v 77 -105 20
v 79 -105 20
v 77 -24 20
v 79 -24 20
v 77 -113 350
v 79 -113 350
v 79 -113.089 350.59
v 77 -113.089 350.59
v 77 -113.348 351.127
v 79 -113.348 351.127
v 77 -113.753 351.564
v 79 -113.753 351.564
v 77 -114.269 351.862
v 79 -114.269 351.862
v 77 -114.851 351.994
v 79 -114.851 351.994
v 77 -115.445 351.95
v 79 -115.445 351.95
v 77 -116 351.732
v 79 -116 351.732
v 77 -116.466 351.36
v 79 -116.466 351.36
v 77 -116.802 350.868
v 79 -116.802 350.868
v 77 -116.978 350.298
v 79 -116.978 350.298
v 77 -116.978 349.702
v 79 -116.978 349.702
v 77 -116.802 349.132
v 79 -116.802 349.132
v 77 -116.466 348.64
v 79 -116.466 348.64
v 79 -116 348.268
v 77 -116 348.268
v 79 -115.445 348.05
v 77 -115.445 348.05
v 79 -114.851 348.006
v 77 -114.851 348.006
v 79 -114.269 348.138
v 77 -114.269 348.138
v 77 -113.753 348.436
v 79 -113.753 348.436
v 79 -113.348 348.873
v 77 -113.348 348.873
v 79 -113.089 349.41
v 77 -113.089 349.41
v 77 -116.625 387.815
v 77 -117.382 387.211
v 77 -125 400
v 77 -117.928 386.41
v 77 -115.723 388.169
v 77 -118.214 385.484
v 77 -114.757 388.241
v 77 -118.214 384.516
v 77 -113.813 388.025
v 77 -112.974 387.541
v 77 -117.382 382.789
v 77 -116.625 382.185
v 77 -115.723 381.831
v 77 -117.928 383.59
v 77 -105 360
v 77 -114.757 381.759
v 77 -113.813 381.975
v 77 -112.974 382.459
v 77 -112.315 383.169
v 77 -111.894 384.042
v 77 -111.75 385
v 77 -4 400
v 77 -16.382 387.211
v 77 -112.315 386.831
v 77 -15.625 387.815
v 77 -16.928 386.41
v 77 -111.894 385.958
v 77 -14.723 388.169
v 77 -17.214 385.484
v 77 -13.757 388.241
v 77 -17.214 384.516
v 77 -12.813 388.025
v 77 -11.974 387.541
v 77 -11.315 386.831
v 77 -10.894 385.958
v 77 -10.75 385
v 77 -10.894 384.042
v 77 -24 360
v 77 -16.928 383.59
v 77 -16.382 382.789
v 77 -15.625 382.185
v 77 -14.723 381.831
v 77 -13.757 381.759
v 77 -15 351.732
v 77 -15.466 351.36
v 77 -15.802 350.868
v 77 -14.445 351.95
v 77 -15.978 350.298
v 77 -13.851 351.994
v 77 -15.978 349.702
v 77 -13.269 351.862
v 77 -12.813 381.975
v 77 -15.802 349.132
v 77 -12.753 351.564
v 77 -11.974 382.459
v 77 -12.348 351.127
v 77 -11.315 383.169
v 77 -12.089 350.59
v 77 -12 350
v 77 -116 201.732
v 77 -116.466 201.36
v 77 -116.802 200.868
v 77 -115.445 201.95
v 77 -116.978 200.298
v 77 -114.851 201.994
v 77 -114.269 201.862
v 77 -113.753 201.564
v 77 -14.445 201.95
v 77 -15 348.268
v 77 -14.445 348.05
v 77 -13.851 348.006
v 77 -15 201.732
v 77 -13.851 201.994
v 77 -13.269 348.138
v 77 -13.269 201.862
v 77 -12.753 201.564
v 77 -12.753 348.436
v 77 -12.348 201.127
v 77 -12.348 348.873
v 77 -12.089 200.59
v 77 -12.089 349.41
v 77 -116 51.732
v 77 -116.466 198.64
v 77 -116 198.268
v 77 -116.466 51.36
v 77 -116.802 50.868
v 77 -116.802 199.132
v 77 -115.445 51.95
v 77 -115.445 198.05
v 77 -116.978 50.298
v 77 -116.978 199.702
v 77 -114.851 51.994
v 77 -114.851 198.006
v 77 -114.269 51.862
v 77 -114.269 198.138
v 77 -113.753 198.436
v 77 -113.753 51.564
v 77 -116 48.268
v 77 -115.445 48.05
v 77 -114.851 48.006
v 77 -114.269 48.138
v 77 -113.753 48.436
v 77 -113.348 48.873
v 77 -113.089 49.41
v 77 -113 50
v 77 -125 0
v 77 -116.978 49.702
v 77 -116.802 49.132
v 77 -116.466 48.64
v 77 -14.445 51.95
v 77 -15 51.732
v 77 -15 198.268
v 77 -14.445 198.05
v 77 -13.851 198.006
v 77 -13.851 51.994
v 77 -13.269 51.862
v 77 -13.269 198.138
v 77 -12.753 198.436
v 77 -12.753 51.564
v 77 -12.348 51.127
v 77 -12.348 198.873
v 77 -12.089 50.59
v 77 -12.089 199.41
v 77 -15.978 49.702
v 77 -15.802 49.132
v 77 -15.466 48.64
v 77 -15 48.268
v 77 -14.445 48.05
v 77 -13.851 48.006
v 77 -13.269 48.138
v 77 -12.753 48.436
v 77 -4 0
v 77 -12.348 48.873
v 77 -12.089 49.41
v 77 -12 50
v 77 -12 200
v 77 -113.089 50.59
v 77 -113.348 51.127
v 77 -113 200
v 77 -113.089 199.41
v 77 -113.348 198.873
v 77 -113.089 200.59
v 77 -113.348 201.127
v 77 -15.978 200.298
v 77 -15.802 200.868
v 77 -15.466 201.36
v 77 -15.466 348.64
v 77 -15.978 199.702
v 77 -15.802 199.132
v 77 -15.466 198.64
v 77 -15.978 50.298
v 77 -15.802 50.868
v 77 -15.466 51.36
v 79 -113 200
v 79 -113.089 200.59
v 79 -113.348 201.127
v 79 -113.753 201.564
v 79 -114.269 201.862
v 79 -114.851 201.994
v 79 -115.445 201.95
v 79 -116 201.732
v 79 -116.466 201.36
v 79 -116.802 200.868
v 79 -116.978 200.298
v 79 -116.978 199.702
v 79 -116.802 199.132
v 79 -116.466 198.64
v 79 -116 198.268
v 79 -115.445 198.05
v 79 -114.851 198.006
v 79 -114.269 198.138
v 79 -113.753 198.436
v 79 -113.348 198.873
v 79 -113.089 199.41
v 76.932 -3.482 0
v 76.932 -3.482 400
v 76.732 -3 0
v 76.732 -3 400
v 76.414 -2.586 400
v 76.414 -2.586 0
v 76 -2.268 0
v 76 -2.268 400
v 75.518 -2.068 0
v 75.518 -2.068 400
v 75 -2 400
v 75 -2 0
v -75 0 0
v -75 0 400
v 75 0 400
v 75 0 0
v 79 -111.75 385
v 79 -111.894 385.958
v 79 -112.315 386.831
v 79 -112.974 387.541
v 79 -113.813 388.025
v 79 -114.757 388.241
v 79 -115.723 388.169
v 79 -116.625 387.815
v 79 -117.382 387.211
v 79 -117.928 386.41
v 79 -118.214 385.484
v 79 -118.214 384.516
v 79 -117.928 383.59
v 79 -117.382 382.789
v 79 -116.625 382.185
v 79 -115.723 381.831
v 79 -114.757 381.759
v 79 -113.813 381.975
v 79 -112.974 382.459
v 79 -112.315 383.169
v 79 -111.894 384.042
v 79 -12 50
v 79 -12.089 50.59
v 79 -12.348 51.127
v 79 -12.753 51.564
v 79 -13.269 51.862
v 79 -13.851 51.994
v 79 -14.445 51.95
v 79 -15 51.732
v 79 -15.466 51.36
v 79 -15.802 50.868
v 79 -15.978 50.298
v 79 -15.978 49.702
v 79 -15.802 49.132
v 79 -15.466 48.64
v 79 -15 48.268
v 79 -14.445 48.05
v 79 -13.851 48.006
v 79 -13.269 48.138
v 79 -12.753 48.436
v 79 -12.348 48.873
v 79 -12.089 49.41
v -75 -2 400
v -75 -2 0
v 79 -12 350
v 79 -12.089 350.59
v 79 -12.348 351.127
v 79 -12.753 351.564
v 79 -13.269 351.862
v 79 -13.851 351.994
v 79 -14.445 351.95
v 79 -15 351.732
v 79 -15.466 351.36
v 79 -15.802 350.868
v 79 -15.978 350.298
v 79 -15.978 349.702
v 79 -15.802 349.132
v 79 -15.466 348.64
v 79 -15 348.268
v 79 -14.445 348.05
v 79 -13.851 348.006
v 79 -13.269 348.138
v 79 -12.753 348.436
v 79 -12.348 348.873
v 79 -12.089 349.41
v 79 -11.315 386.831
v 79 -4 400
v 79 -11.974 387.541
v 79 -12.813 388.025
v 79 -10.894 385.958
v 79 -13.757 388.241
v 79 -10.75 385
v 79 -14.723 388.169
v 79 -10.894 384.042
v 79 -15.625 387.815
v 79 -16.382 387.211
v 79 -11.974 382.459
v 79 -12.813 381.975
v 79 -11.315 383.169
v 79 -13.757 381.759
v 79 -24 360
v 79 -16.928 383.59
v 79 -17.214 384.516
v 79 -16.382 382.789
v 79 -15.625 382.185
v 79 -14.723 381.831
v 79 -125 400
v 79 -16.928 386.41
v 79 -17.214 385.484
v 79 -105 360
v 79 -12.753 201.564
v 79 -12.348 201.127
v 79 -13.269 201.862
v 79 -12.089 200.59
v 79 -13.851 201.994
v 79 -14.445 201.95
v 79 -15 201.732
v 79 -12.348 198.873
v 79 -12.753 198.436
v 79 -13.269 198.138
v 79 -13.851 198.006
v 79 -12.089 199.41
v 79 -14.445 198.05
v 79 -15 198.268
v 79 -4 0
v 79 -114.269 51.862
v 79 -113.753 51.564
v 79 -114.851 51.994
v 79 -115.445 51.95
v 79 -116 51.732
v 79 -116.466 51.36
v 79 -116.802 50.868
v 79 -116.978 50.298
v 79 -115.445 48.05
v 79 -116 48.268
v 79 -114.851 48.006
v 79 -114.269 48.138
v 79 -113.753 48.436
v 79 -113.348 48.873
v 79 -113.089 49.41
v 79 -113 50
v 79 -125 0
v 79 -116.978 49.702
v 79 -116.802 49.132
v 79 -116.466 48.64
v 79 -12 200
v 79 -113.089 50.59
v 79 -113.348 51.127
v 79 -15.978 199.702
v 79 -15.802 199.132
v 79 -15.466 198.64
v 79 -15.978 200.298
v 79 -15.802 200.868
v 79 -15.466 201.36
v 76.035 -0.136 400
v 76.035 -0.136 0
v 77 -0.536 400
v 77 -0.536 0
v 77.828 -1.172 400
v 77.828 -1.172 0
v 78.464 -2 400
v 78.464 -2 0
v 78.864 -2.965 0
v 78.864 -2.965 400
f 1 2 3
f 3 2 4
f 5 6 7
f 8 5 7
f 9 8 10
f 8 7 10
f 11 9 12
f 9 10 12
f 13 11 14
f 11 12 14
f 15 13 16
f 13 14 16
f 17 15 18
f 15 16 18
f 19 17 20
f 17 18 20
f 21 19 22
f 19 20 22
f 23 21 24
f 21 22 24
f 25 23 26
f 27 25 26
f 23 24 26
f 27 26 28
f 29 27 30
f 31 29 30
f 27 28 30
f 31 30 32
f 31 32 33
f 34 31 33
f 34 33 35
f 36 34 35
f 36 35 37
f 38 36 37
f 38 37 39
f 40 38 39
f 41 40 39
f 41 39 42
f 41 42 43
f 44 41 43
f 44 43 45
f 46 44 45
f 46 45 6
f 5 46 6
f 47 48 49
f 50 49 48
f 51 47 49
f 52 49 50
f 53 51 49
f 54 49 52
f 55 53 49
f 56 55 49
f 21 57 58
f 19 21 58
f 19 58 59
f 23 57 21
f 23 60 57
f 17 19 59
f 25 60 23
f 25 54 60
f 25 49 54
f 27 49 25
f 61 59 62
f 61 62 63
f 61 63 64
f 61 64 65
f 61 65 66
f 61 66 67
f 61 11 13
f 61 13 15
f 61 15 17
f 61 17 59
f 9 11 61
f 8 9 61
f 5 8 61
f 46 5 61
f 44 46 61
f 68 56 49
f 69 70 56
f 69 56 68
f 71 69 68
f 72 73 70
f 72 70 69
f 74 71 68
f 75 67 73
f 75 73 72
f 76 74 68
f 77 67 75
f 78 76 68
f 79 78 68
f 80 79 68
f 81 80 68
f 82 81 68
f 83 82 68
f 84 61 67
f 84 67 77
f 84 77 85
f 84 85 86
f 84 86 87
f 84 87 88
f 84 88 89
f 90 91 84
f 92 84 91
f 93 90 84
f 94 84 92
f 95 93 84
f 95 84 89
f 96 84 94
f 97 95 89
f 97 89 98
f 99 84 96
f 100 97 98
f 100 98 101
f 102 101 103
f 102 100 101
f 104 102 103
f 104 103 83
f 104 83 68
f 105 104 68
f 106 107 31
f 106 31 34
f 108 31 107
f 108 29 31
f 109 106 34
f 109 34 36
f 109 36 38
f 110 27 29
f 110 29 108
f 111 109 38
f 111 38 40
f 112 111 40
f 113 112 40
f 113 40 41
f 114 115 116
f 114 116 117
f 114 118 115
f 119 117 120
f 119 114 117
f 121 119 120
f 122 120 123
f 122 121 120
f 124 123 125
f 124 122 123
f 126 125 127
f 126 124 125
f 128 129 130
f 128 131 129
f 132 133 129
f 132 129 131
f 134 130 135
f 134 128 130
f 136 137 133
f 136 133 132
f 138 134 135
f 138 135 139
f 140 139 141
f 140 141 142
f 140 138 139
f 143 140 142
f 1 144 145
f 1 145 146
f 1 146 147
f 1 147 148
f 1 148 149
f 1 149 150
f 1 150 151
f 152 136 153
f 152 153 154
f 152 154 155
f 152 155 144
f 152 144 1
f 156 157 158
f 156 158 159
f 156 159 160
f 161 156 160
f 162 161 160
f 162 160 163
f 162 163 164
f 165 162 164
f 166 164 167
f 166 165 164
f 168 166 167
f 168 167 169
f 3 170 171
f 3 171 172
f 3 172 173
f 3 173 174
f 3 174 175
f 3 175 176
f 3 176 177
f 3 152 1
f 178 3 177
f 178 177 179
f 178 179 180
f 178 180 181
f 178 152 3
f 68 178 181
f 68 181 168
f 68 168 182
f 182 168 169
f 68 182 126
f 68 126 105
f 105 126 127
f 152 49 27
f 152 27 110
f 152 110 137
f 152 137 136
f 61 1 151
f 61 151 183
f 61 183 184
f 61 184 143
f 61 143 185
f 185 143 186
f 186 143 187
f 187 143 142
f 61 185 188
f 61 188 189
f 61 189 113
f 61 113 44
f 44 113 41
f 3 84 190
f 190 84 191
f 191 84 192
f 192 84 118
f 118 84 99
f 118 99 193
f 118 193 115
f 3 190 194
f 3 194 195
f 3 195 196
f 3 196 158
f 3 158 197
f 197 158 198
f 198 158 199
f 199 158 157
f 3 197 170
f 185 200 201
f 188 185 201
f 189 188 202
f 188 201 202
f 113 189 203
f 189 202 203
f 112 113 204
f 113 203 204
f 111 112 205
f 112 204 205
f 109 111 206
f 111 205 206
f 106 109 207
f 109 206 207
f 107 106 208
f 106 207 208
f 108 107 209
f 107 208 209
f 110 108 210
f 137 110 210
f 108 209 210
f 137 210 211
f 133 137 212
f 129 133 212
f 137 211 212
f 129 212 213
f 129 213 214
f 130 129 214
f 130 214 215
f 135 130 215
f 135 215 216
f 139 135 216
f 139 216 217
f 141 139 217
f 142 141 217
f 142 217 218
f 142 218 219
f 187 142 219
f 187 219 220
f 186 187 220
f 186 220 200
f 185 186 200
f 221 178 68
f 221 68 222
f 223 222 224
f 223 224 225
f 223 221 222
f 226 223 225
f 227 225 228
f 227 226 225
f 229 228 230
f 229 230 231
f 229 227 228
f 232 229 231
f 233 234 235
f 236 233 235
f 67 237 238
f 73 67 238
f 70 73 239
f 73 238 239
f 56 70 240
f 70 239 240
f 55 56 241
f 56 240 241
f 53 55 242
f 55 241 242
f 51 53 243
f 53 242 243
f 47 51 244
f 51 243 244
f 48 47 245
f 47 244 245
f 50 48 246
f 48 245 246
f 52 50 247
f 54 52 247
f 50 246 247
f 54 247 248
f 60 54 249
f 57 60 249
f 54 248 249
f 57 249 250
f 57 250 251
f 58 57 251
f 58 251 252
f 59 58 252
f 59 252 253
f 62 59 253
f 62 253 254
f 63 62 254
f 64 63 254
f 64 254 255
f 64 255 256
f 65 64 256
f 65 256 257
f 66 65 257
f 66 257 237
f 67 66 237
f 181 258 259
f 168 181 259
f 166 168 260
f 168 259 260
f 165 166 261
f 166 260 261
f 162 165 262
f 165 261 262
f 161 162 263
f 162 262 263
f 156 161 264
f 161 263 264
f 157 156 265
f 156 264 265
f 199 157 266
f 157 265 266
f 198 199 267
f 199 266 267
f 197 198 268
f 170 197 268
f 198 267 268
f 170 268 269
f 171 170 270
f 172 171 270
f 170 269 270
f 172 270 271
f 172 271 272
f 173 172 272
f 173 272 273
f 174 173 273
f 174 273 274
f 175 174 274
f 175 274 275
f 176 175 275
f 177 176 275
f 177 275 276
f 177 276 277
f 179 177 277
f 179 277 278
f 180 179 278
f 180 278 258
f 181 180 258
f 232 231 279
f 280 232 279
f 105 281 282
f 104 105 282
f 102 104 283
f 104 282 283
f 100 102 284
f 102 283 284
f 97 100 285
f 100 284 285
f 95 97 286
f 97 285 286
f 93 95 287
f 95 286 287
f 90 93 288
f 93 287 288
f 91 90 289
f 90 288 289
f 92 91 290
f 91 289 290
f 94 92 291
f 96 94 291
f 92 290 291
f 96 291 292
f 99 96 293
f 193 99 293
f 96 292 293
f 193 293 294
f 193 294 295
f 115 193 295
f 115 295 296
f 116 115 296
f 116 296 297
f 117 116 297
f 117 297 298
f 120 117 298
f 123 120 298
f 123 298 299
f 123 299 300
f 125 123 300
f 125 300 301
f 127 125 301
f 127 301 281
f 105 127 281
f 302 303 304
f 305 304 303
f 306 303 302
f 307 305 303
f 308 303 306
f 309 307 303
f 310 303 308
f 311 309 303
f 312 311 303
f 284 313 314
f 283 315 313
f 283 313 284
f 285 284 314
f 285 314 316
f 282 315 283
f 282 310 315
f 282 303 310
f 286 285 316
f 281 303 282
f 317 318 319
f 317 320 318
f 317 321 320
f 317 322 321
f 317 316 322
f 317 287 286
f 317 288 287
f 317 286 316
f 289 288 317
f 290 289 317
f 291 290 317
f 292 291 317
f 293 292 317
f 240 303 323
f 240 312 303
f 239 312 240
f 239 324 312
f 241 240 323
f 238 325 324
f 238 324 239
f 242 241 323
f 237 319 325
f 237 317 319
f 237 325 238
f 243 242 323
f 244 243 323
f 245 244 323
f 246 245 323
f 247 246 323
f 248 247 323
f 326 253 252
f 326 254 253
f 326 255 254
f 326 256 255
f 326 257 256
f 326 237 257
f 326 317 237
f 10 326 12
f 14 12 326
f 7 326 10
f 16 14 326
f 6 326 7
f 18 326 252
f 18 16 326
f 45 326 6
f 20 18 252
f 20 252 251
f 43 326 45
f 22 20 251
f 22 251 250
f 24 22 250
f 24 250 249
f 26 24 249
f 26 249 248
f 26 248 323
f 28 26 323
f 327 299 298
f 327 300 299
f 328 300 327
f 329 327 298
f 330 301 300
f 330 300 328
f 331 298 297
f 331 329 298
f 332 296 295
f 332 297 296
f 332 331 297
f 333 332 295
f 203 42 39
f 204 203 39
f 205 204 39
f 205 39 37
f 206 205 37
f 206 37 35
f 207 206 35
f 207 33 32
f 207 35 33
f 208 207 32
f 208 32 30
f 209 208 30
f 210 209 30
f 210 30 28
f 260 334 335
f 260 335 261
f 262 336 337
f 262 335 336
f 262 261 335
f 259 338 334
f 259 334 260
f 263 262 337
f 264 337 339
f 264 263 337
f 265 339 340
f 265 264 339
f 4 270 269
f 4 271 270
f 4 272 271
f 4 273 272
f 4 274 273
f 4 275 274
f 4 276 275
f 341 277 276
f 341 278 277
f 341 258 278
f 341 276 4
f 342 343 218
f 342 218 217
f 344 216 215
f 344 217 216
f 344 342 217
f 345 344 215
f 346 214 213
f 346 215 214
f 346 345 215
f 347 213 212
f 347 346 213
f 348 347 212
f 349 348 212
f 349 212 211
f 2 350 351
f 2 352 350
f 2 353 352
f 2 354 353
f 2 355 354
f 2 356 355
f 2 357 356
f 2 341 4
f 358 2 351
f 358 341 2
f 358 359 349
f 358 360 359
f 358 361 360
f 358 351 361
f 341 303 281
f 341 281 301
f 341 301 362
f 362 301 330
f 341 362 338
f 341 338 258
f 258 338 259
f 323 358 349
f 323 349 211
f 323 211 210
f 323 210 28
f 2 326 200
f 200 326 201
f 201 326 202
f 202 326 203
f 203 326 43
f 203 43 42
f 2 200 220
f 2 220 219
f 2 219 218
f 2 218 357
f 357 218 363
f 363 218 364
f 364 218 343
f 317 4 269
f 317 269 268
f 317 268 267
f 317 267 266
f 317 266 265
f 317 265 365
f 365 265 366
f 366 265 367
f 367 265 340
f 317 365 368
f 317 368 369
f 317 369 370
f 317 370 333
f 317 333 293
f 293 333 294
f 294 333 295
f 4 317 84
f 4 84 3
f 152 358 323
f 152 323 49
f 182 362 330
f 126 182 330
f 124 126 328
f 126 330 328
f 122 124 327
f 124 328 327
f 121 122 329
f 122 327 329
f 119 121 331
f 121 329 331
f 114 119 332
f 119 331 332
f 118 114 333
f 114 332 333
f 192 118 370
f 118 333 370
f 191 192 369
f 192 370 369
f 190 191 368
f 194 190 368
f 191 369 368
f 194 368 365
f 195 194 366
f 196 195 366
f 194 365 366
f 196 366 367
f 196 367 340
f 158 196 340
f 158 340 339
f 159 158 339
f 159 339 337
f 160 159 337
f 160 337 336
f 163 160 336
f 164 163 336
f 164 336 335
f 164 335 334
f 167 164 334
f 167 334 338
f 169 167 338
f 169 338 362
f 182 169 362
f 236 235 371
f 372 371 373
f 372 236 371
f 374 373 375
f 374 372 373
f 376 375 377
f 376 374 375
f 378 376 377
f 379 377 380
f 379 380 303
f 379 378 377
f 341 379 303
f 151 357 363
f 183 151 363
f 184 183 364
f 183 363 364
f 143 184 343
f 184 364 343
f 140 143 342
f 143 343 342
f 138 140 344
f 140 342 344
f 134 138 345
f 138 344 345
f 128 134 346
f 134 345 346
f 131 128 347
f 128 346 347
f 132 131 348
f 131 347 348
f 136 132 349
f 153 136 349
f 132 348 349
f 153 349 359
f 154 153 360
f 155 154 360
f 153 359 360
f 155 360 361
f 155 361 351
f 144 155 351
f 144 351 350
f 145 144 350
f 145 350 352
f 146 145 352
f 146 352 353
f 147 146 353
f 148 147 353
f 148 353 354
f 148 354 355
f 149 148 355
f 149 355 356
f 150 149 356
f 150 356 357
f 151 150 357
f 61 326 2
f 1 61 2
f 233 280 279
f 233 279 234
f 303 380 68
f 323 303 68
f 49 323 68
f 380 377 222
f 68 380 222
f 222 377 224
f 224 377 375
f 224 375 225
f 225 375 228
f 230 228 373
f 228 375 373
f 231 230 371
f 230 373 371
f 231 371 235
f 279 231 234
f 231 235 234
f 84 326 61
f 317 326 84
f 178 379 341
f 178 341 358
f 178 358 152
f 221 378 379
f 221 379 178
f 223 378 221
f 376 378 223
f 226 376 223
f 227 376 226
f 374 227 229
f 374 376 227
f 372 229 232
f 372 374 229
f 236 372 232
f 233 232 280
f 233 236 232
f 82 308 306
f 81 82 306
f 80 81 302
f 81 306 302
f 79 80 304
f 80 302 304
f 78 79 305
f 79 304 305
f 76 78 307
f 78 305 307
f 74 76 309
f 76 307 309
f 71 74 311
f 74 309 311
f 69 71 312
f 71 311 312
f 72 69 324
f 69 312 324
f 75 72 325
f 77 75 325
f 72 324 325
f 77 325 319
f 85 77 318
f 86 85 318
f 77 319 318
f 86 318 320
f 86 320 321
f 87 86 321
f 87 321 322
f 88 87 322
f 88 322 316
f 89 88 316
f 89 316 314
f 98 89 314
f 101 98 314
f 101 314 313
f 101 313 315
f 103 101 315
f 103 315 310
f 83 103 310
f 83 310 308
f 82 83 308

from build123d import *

# Parameters (mm, degrees)
BOSS_EXTRUDE1_DEPTH  = 400
CUT_EXTRUDE1_REACH   = 448.476
SKETCH2_W            = 340
SKETCH2_H            = 81
CUT_EXTRUDE2_REACH   = 448.476
SKETCH4_R            = 3.25
SKETCH5_R            = 2
CUT_EXTRUDE3_DEPTH   = 10
CONVERT_SOLID1_DEPTH = 400


# Read off the part's stored shape, not the designer's step: Convert-Solid1
with BuildPart() as part:
    # Sketch1 → Boss-Extrude1 (new body)
    with BuildSketch(Plane.XY):
        with BuildLine():
            Line((-75, 0), (75, 0))
            ThreePointArc((75, 0), (77.828427125, -1.171572875), (79, -4))
            Line((79, -4), (79, -125))
            Line((79, -125), (77, -125))
            Line((77, -125), (77, -6))
            ThreePointArc((77, -6), (75.828427125, -3.171572875), (73, -2))
            Line((73, -2), (-75, -2))
            Line((-75, -2), (-75, 0))
        make_face()
    extrude(amount=BOSS_EXTRUDE1_DEPTH)

    # Sketch2 → Cut-Extrude1 (cut, up to next)
    with BuildSketch(Plane(origin=(79, 0, 0), x_dir=(0, 0, -1), z_dir=(1, 0, 0)), mode=Mode.PRIVATE) as cut_extrude1_sk1:
        with Locations((-190, -64.5)):
            Rectangle(SKETCH2_W, SKETCH2_H)
    cut_extrude1_tool1 = extrude(cut_extrude1_sk1.sketch, amount=-CUT_EXTRUDE1_REACH, mode=Mode.PRIVATE) & part.part
    add(cut_extrude1_tool1.solids().sort_by_distance((79, -64.5, 190))[0], mode=Mode.SUBTRACT)

    # Sketch4 → Cut-Extrude2 (cut, up to next)
    with BuildSketch(Plane(origin=(79, 0, 0), x_dir=(0, 0, -1), z_dir=(1, 0, 0)), mode=Mode.PRIVATE) as cut_extrude2_sk1:
        with Locations(Location((-385, -14, 0), (0, 0, 90))):
            Circle(SKETCH4_R)
    cut_extrude2_tool1 = extrude(cut_extrude2_sk1.sketch, amount=-CUT_EXTRUDE2_REACH, mode=Mode.PRIVATE) & part.part
    # Sketch4 → Cut-Extrude2 (cut, up to next)
    with BuildSketch(Plane(origin=(79, 0, 0), x_dir=(0, 0, -1), z_dir=(1, 0, 0)), mode=Mode.PRIVATE) as cut_extrude2_sk2:
        with Locations(Location((-385, -115, 0), (0, 0, 90))):
            Circle(SKETCH4_R)
    cut_extrude2_tool2 = extrude(cut_extrude2_sk2.sketch, amount=-CUT_EXTRUDE2_REACH, mode=Mode.PRIVATE) & part.part
    add(cut_extrude2_tool1.solids().sort_by_distance((79, -14, 385))[0], mode=Mode.SUBTRACT)
    add(cut_extrude2_tool2.solids().sort_by_distance((79, -115, 385))[0], mode=Mode.SUBTRACT)

    # Sketch5 → Cut-Extrude3 (cut)
    with BuildSketch(Plane(origin=(79, 0, 0), x_dir=(0, 0, -1), z_dir=(1, 0, 0))):
        with Locations(Location((-50, -115, 0), (0, 0, 90))):
            Circle(SKETCH5_R)
        with Locations(Location((-200, -115, 0), (0, 0, 90))):
            Circle(SKETCH5_R)
        with Locations(Location((-350, -115, 0), (0, 0, 90))):
            Circle(SKETCH5_R)
        with Locations(Location((-350, -14, 0), (0, 0, 90))):
            Circle(SKETCH5_R)
        with Locations(Location((-200, -14, 0), (0, 0, 90))):
            Circle(SKETCH5_R)
        with Locations(Location((-50, -14, 0), (0, 0, 90))):
            Circle(SKETCH5_R)
    extrude(amount=-CUT_EXTRUDE3_DEPTH, mode=Mode.SUBTRACT)

    # Convert-Solid1 outline → Convert-Solid1 (cut)
    with BuildSketch(Plane.XY):
        with BuildLine():
            ThreePointArc((77, -4), (76.414213562, -2.585786438), (75, -2))
            Line((75, -2), (73, -2))
            ThreePointArc((73, -2), (75.828427125, -3.171572875), (77, -6))
            Line((77, -6), (77, -4))
        make_face()
    extrude(amount=CONVERT_SOLID1_DEPTH, mode=Mode.SUBTRACT)


solid = part.part
